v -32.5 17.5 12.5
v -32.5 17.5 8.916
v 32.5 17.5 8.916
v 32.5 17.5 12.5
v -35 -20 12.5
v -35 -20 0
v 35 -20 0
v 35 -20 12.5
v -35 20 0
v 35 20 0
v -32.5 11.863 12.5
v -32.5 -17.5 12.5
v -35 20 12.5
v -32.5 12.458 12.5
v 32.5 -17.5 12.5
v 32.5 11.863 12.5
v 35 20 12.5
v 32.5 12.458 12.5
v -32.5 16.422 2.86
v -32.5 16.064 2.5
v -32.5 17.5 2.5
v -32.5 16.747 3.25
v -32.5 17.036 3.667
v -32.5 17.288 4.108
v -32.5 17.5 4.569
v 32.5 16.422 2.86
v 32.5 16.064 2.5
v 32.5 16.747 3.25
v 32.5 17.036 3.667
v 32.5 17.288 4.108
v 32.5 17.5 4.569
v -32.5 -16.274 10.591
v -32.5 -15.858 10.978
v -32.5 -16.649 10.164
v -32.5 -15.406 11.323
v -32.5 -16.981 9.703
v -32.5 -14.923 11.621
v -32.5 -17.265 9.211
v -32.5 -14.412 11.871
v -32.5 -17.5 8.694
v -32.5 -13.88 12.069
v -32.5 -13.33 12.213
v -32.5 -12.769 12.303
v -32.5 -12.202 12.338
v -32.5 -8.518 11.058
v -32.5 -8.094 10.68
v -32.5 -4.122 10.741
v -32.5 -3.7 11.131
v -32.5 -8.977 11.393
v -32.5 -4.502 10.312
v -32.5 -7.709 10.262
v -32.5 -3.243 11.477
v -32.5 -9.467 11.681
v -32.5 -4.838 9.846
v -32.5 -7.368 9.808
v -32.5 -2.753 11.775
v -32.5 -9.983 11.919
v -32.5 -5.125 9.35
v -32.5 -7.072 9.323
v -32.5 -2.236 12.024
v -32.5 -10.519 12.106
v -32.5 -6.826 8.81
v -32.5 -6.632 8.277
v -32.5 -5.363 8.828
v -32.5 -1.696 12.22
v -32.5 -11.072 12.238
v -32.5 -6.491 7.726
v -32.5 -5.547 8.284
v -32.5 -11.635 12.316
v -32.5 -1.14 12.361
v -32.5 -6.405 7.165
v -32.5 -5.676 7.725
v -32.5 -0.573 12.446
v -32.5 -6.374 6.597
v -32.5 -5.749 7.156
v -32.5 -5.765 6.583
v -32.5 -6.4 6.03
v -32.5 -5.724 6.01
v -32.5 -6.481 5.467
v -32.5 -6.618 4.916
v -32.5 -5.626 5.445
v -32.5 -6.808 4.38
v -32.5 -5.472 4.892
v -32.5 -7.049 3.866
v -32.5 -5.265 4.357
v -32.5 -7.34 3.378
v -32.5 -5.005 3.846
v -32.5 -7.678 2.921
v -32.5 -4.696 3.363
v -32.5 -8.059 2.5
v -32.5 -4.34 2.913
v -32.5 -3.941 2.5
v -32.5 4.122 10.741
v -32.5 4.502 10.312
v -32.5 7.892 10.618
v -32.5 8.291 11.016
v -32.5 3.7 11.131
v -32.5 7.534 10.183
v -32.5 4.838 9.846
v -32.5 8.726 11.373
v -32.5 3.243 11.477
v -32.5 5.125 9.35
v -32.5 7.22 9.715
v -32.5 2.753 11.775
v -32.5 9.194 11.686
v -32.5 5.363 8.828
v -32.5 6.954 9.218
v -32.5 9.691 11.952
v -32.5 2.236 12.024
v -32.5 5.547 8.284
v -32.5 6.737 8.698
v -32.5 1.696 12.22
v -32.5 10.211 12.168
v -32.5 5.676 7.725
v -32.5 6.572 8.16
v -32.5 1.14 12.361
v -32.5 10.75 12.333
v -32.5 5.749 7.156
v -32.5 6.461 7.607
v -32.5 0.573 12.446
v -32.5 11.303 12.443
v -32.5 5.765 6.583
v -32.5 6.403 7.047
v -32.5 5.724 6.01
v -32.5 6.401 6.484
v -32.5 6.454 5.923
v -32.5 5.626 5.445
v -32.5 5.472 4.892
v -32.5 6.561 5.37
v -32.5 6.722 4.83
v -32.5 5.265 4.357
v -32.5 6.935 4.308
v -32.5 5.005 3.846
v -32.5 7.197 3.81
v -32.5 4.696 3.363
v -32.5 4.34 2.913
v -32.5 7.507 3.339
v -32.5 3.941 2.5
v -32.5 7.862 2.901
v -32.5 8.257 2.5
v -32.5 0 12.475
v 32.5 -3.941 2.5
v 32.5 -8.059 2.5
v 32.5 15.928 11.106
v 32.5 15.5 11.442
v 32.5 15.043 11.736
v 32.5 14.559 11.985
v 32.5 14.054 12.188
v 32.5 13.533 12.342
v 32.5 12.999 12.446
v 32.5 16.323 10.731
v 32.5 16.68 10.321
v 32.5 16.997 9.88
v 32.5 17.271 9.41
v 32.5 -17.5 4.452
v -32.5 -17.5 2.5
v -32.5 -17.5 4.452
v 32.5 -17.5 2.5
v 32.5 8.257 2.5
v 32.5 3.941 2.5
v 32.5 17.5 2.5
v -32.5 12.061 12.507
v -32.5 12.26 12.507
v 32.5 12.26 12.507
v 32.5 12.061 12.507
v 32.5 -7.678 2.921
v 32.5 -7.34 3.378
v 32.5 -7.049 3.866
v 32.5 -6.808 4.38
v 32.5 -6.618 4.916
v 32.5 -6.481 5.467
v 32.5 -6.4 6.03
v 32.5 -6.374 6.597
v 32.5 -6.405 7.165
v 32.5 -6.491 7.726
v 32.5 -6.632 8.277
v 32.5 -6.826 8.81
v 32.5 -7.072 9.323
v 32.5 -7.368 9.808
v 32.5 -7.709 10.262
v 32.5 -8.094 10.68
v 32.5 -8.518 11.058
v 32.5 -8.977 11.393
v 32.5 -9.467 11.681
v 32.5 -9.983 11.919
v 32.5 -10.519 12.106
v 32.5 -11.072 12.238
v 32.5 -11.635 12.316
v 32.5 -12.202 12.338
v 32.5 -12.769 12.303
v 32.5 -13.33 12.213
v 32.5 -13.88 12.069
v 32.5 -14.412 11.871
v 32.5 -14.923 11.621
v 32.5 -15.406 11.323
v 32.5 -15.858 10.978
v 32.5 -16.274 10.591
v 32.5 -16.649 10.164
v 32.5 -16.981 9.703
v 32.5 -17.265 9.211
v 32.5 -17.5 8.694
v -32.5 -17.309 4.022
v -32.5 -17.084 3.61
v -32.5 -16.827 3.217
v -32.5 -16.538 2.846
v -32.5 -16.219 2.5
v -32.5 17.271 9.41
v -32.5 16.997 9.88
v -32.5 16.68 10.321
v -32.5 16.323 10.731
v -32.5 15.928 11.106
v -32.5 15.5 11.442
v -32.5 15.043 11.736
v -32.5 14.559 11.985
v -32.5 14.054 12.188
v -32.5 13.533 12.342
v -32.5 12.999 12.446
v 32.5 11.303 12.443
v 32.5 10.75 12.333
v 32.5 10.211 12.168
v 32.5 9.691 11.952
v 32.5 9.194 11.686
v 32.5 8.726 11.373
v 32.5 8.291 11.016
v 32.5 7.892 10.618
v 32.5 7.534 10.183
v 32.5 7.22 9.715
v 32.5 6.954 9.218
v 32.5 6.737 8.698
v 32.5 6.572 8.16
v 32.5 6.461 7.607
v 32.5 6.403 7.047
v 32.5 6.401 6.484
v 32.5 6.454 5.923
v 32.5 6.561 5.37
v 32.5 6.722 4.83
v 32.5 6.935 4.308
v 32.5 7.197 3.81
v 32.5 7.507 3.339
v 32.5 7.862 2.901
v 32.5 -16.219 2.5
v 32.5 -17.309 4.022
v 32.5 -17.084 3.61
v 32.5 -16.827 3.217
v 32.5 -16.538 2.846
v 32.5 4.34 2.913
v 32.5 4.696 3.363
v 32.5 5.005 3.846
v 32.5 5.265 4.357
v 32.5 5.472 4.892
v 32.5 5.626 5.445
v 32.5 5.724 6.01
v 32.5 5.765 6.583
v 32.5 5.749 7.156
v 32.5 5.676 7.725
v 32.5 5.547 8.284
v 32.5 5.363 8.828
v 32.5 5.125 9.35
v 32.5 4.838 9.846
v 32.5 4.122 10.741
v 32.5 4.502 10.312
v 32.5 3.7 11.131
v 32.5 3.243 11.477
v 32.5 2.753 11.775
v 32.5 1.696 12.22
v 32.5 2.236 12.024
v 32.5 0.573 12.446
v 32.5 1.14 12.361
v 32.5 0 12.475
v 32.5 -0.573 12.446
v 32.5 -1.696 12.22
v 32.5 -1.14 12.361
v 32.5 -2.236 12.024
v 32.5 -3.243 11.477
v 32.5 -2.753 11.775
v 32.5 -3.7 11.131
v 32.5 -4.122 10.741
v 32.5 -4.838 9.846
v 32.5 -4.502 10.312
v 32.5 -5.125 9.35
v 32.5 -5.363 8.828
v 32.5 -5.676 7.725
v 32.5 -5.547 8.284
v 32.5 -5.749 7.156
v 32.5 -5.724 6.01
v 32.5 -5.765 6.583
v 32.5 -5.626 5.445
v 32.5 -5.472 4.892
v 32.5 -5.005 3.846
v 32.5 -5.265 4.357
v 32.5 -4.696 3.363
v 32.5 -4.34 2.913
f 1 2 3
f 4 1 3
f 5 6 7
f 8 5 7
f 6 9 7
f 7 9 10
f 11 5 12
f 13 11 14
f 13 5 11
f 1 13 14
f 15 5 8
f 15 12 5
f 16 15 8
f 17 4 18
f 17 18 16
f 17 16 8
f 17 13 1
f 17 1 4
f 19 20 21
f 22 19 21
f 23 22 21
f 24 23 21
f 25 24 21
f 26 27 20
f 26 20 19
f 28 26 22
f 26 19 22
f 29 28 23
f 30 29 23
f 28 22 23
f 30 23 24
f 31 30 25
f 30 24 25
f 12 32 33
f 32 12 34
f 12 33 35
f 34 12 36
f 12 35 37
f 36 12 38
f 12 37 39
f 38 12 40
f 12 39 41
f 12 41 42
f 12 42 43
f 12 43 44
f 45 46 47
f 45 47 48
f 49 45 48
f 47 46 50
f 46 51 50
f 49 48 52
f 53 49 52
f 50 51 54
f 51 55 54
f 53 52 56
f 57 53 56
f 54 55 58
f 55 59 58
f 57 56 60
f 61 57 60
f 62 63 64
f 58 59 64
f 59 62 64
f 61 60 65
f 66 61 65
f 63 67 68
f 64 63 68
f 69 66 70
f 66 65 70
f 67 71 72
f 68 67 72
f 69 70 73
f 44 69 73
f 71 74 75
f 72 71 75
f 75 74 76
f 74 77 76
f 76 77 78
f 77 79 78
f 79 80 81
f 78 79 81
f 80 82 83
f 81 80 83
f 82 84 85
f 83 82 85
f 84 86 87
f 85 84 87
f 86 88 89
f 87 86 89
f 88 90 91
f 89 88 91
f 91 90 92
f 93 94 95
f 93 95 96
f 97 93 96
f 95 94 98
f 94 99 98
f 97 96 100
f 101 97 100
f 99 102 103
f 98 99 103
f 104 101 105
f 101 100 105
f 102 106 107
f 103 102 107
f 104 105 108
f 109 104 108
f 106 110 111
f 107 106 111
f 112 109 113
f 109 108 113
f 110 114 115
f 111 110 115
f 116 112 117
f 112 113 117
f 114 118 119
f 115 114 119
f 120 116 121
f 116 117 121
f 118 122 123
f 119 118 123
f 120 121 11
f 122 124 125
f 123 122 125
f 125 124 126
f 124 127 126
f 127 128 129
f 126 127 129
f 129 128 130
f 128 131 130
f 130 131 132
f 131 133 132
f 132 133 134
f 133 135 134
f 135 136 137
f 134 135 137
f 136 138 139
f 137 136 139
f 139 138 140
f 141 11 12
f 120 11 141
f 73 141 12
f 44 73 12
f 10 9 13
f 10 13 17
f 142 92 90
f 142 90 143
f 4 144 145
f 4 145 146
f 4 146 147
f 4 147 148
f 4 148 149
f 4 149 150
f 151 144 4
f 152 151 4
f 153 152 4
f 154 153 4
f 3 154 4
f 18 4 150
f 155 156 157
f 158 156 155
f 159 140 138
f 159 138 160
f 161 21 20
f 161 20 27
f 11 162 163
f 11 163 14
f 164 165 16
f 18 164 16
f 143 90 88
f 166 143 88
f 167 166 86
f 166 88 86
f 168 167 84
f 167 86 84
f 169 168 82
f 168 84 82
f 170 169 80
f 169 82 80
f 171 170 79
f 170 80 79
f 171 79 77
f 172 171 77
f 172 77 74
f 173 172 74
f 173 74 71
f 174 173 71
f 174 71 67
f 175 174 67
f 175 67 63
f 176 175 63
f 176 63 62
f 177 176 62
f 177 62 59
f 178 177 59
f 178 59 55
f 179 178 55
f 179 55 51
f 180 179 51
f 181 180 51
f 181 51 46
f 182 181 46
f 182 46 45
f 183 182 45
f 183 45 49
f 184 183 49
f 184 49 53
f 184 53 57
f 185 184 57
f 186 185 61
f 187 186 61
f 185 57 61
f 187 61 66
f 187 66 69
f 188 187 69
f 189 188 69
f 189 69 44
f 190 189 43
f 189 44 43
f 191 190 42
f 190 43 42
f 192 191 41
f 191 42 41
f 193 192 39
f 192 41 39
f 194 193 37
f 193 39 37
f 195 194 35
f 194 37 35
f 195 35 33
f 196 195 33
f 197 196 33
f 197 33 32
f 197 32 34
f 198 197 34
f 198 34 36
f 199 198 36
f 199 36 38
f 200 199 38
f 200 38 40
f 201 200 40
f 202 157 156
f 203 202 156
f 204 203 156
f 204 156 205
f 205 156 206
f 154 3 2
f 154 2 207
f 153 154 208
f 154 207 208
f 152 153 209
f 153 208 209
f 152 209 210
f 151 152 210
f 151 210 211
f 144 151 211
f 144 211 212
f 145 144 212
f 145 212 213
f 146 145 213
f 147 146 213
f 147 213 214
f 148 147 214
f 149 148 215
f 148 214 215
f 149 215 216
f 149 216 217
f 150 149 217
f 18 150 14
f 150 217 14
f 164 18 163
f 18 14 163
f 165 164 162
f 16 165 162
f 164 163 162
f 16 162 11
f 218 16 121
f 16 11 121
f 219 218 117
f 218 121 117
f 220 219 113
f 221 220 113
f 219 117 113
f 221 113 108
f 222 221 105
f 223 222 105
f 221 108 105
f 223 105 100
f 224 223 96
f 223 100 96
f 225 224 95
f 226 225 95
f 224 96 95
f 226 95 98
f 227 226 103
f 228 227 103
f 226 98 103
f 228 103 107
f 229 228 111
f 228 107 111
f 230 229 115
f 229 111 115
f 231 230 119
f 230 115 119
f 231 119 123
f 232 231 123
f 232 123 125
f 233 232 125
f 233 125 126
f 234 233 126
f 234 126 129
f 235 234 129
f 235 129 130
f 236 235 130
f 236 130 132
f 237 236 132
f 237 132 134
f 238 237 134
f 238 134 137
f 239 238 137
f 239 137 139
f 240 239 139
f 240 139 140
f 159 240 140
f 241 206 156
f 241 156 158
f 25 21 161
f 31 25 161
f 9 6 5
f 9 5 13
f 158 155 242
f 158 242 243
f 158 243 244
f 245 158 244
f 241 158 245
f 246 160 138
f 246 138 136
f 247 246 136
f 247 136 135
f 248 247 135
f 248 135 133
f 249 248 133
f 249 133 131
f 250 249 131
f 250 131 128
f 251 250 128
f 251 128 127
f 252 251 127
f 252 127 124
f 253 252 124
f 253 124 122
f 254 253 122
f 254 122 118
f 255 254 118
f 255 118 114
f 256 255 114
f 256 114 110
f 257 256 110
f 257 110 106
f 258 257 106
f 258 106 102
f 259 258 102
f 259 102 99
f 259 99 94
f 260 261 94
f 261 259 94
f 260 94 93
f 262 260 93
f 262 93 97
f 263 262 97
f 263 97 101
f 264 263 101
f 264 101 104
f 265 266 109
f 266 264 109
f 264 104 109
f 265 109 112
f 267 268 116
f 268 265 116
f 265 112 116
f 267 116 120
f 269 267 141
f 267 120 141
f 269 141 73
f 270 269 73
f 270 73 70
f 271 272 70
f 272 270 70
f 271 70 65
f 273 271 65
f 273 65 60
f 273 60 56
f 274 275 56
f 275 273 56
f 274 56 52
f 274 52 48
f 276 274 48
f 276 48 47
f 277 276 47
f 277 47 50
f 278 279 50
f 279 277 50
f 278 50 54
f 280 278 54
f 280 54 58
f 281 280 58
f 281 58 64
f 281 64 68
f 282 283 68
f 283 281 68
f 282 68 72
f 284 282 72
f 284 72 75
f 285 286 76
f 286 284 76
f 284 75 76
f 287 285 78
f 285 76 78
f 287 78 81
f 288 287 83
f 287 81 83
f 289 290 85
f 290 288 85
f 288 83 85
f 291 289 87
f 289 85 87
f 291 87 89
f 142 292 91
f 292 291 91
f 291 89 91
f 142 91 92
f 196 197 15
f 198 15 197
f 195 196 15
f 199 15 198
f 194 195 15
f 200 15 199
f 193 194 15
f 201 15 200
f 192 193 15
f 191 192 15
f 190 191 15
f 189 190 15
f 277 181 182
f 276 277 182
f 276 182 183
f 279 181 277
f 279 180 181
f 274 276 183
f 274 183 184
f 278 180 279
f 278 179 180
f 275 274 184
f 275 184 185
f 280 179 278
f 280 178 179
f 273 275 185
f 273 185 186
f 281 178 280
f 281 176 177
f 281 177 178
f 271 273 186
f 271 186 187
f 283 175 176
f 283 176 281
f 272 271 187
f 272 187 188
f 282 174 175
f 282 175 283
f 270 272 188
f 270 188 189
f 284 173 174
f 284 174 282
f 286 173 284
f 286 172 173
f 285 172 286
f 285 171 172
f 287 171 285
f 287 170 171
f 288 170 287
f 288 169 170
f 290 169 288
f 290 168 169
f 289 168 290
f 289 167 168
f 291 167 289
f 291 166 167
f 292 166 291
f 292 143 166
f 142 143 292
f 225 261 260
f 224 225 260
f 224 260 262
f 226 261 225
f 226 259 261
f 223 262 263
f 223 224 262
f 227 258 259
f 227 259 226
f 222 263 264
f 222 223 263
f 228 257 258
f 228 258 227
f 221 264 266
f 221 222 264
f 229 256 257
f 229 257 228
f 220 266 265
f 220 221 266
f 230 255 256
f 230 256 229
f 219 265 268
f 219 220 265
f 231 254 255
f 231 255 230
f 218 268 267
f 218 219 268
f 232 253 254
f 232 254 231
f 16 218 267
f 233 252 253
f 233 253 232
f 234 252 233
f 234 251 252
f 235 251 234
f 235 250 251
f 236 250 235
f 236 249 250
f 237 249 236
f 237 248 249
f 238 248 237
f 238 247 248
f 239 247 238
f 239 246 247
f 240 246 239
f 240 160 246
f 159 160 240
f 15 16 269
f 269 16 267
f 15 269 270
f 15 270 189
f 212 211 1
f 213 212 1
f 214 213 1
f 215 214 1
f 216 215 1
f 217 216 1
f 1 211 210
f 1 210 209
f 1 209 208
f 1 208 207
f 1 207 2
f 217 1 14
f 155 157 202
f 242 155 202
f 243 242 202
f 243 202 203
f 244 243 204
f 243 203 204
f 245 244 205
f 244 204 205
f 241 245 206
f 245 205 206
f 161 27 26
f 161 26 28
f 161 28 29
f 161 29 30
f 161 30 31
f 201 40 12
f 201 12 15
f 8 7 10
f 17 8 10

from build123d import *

# Parameters (mm, degrees)
F0_W     = 70
F0_H     = 40
F1_DEPTH = 12.5
F2_T     = -2.5
F4_R     = 5.76607
F4_R_2   = 5.765
F5_DEPTH = 65


with BuildPart() as f1:
    # F0 (on Top) → F1 (new body)
    with BuildSketch(Plane.XY):
        Rectangle(F0_W, F0_H)
    extrude(amount=F1_DEPTH)

    # F2
    f2_openings = [f1.faces().sort_by_distance(p)[0] for p in [
        (0, 0, 12.5),
    ]]
    offset(amount=F2_T, openings=f2_openings)

    # F4 (on offset) → F5 (join)
    with BuildSketch(Plane.YZ.offset(-32.5)):
        with Locations((0, 6.708693)):
            Circle(F4_R)
        with Locations((12.160433, 6.742671)):
            Circle(F4_R_2)
        with Locations((-12.139365, 6.572861)):
            Circle(F4_R_2)
    extrude(amount=F5_DEPTH)


solid = f1.part
